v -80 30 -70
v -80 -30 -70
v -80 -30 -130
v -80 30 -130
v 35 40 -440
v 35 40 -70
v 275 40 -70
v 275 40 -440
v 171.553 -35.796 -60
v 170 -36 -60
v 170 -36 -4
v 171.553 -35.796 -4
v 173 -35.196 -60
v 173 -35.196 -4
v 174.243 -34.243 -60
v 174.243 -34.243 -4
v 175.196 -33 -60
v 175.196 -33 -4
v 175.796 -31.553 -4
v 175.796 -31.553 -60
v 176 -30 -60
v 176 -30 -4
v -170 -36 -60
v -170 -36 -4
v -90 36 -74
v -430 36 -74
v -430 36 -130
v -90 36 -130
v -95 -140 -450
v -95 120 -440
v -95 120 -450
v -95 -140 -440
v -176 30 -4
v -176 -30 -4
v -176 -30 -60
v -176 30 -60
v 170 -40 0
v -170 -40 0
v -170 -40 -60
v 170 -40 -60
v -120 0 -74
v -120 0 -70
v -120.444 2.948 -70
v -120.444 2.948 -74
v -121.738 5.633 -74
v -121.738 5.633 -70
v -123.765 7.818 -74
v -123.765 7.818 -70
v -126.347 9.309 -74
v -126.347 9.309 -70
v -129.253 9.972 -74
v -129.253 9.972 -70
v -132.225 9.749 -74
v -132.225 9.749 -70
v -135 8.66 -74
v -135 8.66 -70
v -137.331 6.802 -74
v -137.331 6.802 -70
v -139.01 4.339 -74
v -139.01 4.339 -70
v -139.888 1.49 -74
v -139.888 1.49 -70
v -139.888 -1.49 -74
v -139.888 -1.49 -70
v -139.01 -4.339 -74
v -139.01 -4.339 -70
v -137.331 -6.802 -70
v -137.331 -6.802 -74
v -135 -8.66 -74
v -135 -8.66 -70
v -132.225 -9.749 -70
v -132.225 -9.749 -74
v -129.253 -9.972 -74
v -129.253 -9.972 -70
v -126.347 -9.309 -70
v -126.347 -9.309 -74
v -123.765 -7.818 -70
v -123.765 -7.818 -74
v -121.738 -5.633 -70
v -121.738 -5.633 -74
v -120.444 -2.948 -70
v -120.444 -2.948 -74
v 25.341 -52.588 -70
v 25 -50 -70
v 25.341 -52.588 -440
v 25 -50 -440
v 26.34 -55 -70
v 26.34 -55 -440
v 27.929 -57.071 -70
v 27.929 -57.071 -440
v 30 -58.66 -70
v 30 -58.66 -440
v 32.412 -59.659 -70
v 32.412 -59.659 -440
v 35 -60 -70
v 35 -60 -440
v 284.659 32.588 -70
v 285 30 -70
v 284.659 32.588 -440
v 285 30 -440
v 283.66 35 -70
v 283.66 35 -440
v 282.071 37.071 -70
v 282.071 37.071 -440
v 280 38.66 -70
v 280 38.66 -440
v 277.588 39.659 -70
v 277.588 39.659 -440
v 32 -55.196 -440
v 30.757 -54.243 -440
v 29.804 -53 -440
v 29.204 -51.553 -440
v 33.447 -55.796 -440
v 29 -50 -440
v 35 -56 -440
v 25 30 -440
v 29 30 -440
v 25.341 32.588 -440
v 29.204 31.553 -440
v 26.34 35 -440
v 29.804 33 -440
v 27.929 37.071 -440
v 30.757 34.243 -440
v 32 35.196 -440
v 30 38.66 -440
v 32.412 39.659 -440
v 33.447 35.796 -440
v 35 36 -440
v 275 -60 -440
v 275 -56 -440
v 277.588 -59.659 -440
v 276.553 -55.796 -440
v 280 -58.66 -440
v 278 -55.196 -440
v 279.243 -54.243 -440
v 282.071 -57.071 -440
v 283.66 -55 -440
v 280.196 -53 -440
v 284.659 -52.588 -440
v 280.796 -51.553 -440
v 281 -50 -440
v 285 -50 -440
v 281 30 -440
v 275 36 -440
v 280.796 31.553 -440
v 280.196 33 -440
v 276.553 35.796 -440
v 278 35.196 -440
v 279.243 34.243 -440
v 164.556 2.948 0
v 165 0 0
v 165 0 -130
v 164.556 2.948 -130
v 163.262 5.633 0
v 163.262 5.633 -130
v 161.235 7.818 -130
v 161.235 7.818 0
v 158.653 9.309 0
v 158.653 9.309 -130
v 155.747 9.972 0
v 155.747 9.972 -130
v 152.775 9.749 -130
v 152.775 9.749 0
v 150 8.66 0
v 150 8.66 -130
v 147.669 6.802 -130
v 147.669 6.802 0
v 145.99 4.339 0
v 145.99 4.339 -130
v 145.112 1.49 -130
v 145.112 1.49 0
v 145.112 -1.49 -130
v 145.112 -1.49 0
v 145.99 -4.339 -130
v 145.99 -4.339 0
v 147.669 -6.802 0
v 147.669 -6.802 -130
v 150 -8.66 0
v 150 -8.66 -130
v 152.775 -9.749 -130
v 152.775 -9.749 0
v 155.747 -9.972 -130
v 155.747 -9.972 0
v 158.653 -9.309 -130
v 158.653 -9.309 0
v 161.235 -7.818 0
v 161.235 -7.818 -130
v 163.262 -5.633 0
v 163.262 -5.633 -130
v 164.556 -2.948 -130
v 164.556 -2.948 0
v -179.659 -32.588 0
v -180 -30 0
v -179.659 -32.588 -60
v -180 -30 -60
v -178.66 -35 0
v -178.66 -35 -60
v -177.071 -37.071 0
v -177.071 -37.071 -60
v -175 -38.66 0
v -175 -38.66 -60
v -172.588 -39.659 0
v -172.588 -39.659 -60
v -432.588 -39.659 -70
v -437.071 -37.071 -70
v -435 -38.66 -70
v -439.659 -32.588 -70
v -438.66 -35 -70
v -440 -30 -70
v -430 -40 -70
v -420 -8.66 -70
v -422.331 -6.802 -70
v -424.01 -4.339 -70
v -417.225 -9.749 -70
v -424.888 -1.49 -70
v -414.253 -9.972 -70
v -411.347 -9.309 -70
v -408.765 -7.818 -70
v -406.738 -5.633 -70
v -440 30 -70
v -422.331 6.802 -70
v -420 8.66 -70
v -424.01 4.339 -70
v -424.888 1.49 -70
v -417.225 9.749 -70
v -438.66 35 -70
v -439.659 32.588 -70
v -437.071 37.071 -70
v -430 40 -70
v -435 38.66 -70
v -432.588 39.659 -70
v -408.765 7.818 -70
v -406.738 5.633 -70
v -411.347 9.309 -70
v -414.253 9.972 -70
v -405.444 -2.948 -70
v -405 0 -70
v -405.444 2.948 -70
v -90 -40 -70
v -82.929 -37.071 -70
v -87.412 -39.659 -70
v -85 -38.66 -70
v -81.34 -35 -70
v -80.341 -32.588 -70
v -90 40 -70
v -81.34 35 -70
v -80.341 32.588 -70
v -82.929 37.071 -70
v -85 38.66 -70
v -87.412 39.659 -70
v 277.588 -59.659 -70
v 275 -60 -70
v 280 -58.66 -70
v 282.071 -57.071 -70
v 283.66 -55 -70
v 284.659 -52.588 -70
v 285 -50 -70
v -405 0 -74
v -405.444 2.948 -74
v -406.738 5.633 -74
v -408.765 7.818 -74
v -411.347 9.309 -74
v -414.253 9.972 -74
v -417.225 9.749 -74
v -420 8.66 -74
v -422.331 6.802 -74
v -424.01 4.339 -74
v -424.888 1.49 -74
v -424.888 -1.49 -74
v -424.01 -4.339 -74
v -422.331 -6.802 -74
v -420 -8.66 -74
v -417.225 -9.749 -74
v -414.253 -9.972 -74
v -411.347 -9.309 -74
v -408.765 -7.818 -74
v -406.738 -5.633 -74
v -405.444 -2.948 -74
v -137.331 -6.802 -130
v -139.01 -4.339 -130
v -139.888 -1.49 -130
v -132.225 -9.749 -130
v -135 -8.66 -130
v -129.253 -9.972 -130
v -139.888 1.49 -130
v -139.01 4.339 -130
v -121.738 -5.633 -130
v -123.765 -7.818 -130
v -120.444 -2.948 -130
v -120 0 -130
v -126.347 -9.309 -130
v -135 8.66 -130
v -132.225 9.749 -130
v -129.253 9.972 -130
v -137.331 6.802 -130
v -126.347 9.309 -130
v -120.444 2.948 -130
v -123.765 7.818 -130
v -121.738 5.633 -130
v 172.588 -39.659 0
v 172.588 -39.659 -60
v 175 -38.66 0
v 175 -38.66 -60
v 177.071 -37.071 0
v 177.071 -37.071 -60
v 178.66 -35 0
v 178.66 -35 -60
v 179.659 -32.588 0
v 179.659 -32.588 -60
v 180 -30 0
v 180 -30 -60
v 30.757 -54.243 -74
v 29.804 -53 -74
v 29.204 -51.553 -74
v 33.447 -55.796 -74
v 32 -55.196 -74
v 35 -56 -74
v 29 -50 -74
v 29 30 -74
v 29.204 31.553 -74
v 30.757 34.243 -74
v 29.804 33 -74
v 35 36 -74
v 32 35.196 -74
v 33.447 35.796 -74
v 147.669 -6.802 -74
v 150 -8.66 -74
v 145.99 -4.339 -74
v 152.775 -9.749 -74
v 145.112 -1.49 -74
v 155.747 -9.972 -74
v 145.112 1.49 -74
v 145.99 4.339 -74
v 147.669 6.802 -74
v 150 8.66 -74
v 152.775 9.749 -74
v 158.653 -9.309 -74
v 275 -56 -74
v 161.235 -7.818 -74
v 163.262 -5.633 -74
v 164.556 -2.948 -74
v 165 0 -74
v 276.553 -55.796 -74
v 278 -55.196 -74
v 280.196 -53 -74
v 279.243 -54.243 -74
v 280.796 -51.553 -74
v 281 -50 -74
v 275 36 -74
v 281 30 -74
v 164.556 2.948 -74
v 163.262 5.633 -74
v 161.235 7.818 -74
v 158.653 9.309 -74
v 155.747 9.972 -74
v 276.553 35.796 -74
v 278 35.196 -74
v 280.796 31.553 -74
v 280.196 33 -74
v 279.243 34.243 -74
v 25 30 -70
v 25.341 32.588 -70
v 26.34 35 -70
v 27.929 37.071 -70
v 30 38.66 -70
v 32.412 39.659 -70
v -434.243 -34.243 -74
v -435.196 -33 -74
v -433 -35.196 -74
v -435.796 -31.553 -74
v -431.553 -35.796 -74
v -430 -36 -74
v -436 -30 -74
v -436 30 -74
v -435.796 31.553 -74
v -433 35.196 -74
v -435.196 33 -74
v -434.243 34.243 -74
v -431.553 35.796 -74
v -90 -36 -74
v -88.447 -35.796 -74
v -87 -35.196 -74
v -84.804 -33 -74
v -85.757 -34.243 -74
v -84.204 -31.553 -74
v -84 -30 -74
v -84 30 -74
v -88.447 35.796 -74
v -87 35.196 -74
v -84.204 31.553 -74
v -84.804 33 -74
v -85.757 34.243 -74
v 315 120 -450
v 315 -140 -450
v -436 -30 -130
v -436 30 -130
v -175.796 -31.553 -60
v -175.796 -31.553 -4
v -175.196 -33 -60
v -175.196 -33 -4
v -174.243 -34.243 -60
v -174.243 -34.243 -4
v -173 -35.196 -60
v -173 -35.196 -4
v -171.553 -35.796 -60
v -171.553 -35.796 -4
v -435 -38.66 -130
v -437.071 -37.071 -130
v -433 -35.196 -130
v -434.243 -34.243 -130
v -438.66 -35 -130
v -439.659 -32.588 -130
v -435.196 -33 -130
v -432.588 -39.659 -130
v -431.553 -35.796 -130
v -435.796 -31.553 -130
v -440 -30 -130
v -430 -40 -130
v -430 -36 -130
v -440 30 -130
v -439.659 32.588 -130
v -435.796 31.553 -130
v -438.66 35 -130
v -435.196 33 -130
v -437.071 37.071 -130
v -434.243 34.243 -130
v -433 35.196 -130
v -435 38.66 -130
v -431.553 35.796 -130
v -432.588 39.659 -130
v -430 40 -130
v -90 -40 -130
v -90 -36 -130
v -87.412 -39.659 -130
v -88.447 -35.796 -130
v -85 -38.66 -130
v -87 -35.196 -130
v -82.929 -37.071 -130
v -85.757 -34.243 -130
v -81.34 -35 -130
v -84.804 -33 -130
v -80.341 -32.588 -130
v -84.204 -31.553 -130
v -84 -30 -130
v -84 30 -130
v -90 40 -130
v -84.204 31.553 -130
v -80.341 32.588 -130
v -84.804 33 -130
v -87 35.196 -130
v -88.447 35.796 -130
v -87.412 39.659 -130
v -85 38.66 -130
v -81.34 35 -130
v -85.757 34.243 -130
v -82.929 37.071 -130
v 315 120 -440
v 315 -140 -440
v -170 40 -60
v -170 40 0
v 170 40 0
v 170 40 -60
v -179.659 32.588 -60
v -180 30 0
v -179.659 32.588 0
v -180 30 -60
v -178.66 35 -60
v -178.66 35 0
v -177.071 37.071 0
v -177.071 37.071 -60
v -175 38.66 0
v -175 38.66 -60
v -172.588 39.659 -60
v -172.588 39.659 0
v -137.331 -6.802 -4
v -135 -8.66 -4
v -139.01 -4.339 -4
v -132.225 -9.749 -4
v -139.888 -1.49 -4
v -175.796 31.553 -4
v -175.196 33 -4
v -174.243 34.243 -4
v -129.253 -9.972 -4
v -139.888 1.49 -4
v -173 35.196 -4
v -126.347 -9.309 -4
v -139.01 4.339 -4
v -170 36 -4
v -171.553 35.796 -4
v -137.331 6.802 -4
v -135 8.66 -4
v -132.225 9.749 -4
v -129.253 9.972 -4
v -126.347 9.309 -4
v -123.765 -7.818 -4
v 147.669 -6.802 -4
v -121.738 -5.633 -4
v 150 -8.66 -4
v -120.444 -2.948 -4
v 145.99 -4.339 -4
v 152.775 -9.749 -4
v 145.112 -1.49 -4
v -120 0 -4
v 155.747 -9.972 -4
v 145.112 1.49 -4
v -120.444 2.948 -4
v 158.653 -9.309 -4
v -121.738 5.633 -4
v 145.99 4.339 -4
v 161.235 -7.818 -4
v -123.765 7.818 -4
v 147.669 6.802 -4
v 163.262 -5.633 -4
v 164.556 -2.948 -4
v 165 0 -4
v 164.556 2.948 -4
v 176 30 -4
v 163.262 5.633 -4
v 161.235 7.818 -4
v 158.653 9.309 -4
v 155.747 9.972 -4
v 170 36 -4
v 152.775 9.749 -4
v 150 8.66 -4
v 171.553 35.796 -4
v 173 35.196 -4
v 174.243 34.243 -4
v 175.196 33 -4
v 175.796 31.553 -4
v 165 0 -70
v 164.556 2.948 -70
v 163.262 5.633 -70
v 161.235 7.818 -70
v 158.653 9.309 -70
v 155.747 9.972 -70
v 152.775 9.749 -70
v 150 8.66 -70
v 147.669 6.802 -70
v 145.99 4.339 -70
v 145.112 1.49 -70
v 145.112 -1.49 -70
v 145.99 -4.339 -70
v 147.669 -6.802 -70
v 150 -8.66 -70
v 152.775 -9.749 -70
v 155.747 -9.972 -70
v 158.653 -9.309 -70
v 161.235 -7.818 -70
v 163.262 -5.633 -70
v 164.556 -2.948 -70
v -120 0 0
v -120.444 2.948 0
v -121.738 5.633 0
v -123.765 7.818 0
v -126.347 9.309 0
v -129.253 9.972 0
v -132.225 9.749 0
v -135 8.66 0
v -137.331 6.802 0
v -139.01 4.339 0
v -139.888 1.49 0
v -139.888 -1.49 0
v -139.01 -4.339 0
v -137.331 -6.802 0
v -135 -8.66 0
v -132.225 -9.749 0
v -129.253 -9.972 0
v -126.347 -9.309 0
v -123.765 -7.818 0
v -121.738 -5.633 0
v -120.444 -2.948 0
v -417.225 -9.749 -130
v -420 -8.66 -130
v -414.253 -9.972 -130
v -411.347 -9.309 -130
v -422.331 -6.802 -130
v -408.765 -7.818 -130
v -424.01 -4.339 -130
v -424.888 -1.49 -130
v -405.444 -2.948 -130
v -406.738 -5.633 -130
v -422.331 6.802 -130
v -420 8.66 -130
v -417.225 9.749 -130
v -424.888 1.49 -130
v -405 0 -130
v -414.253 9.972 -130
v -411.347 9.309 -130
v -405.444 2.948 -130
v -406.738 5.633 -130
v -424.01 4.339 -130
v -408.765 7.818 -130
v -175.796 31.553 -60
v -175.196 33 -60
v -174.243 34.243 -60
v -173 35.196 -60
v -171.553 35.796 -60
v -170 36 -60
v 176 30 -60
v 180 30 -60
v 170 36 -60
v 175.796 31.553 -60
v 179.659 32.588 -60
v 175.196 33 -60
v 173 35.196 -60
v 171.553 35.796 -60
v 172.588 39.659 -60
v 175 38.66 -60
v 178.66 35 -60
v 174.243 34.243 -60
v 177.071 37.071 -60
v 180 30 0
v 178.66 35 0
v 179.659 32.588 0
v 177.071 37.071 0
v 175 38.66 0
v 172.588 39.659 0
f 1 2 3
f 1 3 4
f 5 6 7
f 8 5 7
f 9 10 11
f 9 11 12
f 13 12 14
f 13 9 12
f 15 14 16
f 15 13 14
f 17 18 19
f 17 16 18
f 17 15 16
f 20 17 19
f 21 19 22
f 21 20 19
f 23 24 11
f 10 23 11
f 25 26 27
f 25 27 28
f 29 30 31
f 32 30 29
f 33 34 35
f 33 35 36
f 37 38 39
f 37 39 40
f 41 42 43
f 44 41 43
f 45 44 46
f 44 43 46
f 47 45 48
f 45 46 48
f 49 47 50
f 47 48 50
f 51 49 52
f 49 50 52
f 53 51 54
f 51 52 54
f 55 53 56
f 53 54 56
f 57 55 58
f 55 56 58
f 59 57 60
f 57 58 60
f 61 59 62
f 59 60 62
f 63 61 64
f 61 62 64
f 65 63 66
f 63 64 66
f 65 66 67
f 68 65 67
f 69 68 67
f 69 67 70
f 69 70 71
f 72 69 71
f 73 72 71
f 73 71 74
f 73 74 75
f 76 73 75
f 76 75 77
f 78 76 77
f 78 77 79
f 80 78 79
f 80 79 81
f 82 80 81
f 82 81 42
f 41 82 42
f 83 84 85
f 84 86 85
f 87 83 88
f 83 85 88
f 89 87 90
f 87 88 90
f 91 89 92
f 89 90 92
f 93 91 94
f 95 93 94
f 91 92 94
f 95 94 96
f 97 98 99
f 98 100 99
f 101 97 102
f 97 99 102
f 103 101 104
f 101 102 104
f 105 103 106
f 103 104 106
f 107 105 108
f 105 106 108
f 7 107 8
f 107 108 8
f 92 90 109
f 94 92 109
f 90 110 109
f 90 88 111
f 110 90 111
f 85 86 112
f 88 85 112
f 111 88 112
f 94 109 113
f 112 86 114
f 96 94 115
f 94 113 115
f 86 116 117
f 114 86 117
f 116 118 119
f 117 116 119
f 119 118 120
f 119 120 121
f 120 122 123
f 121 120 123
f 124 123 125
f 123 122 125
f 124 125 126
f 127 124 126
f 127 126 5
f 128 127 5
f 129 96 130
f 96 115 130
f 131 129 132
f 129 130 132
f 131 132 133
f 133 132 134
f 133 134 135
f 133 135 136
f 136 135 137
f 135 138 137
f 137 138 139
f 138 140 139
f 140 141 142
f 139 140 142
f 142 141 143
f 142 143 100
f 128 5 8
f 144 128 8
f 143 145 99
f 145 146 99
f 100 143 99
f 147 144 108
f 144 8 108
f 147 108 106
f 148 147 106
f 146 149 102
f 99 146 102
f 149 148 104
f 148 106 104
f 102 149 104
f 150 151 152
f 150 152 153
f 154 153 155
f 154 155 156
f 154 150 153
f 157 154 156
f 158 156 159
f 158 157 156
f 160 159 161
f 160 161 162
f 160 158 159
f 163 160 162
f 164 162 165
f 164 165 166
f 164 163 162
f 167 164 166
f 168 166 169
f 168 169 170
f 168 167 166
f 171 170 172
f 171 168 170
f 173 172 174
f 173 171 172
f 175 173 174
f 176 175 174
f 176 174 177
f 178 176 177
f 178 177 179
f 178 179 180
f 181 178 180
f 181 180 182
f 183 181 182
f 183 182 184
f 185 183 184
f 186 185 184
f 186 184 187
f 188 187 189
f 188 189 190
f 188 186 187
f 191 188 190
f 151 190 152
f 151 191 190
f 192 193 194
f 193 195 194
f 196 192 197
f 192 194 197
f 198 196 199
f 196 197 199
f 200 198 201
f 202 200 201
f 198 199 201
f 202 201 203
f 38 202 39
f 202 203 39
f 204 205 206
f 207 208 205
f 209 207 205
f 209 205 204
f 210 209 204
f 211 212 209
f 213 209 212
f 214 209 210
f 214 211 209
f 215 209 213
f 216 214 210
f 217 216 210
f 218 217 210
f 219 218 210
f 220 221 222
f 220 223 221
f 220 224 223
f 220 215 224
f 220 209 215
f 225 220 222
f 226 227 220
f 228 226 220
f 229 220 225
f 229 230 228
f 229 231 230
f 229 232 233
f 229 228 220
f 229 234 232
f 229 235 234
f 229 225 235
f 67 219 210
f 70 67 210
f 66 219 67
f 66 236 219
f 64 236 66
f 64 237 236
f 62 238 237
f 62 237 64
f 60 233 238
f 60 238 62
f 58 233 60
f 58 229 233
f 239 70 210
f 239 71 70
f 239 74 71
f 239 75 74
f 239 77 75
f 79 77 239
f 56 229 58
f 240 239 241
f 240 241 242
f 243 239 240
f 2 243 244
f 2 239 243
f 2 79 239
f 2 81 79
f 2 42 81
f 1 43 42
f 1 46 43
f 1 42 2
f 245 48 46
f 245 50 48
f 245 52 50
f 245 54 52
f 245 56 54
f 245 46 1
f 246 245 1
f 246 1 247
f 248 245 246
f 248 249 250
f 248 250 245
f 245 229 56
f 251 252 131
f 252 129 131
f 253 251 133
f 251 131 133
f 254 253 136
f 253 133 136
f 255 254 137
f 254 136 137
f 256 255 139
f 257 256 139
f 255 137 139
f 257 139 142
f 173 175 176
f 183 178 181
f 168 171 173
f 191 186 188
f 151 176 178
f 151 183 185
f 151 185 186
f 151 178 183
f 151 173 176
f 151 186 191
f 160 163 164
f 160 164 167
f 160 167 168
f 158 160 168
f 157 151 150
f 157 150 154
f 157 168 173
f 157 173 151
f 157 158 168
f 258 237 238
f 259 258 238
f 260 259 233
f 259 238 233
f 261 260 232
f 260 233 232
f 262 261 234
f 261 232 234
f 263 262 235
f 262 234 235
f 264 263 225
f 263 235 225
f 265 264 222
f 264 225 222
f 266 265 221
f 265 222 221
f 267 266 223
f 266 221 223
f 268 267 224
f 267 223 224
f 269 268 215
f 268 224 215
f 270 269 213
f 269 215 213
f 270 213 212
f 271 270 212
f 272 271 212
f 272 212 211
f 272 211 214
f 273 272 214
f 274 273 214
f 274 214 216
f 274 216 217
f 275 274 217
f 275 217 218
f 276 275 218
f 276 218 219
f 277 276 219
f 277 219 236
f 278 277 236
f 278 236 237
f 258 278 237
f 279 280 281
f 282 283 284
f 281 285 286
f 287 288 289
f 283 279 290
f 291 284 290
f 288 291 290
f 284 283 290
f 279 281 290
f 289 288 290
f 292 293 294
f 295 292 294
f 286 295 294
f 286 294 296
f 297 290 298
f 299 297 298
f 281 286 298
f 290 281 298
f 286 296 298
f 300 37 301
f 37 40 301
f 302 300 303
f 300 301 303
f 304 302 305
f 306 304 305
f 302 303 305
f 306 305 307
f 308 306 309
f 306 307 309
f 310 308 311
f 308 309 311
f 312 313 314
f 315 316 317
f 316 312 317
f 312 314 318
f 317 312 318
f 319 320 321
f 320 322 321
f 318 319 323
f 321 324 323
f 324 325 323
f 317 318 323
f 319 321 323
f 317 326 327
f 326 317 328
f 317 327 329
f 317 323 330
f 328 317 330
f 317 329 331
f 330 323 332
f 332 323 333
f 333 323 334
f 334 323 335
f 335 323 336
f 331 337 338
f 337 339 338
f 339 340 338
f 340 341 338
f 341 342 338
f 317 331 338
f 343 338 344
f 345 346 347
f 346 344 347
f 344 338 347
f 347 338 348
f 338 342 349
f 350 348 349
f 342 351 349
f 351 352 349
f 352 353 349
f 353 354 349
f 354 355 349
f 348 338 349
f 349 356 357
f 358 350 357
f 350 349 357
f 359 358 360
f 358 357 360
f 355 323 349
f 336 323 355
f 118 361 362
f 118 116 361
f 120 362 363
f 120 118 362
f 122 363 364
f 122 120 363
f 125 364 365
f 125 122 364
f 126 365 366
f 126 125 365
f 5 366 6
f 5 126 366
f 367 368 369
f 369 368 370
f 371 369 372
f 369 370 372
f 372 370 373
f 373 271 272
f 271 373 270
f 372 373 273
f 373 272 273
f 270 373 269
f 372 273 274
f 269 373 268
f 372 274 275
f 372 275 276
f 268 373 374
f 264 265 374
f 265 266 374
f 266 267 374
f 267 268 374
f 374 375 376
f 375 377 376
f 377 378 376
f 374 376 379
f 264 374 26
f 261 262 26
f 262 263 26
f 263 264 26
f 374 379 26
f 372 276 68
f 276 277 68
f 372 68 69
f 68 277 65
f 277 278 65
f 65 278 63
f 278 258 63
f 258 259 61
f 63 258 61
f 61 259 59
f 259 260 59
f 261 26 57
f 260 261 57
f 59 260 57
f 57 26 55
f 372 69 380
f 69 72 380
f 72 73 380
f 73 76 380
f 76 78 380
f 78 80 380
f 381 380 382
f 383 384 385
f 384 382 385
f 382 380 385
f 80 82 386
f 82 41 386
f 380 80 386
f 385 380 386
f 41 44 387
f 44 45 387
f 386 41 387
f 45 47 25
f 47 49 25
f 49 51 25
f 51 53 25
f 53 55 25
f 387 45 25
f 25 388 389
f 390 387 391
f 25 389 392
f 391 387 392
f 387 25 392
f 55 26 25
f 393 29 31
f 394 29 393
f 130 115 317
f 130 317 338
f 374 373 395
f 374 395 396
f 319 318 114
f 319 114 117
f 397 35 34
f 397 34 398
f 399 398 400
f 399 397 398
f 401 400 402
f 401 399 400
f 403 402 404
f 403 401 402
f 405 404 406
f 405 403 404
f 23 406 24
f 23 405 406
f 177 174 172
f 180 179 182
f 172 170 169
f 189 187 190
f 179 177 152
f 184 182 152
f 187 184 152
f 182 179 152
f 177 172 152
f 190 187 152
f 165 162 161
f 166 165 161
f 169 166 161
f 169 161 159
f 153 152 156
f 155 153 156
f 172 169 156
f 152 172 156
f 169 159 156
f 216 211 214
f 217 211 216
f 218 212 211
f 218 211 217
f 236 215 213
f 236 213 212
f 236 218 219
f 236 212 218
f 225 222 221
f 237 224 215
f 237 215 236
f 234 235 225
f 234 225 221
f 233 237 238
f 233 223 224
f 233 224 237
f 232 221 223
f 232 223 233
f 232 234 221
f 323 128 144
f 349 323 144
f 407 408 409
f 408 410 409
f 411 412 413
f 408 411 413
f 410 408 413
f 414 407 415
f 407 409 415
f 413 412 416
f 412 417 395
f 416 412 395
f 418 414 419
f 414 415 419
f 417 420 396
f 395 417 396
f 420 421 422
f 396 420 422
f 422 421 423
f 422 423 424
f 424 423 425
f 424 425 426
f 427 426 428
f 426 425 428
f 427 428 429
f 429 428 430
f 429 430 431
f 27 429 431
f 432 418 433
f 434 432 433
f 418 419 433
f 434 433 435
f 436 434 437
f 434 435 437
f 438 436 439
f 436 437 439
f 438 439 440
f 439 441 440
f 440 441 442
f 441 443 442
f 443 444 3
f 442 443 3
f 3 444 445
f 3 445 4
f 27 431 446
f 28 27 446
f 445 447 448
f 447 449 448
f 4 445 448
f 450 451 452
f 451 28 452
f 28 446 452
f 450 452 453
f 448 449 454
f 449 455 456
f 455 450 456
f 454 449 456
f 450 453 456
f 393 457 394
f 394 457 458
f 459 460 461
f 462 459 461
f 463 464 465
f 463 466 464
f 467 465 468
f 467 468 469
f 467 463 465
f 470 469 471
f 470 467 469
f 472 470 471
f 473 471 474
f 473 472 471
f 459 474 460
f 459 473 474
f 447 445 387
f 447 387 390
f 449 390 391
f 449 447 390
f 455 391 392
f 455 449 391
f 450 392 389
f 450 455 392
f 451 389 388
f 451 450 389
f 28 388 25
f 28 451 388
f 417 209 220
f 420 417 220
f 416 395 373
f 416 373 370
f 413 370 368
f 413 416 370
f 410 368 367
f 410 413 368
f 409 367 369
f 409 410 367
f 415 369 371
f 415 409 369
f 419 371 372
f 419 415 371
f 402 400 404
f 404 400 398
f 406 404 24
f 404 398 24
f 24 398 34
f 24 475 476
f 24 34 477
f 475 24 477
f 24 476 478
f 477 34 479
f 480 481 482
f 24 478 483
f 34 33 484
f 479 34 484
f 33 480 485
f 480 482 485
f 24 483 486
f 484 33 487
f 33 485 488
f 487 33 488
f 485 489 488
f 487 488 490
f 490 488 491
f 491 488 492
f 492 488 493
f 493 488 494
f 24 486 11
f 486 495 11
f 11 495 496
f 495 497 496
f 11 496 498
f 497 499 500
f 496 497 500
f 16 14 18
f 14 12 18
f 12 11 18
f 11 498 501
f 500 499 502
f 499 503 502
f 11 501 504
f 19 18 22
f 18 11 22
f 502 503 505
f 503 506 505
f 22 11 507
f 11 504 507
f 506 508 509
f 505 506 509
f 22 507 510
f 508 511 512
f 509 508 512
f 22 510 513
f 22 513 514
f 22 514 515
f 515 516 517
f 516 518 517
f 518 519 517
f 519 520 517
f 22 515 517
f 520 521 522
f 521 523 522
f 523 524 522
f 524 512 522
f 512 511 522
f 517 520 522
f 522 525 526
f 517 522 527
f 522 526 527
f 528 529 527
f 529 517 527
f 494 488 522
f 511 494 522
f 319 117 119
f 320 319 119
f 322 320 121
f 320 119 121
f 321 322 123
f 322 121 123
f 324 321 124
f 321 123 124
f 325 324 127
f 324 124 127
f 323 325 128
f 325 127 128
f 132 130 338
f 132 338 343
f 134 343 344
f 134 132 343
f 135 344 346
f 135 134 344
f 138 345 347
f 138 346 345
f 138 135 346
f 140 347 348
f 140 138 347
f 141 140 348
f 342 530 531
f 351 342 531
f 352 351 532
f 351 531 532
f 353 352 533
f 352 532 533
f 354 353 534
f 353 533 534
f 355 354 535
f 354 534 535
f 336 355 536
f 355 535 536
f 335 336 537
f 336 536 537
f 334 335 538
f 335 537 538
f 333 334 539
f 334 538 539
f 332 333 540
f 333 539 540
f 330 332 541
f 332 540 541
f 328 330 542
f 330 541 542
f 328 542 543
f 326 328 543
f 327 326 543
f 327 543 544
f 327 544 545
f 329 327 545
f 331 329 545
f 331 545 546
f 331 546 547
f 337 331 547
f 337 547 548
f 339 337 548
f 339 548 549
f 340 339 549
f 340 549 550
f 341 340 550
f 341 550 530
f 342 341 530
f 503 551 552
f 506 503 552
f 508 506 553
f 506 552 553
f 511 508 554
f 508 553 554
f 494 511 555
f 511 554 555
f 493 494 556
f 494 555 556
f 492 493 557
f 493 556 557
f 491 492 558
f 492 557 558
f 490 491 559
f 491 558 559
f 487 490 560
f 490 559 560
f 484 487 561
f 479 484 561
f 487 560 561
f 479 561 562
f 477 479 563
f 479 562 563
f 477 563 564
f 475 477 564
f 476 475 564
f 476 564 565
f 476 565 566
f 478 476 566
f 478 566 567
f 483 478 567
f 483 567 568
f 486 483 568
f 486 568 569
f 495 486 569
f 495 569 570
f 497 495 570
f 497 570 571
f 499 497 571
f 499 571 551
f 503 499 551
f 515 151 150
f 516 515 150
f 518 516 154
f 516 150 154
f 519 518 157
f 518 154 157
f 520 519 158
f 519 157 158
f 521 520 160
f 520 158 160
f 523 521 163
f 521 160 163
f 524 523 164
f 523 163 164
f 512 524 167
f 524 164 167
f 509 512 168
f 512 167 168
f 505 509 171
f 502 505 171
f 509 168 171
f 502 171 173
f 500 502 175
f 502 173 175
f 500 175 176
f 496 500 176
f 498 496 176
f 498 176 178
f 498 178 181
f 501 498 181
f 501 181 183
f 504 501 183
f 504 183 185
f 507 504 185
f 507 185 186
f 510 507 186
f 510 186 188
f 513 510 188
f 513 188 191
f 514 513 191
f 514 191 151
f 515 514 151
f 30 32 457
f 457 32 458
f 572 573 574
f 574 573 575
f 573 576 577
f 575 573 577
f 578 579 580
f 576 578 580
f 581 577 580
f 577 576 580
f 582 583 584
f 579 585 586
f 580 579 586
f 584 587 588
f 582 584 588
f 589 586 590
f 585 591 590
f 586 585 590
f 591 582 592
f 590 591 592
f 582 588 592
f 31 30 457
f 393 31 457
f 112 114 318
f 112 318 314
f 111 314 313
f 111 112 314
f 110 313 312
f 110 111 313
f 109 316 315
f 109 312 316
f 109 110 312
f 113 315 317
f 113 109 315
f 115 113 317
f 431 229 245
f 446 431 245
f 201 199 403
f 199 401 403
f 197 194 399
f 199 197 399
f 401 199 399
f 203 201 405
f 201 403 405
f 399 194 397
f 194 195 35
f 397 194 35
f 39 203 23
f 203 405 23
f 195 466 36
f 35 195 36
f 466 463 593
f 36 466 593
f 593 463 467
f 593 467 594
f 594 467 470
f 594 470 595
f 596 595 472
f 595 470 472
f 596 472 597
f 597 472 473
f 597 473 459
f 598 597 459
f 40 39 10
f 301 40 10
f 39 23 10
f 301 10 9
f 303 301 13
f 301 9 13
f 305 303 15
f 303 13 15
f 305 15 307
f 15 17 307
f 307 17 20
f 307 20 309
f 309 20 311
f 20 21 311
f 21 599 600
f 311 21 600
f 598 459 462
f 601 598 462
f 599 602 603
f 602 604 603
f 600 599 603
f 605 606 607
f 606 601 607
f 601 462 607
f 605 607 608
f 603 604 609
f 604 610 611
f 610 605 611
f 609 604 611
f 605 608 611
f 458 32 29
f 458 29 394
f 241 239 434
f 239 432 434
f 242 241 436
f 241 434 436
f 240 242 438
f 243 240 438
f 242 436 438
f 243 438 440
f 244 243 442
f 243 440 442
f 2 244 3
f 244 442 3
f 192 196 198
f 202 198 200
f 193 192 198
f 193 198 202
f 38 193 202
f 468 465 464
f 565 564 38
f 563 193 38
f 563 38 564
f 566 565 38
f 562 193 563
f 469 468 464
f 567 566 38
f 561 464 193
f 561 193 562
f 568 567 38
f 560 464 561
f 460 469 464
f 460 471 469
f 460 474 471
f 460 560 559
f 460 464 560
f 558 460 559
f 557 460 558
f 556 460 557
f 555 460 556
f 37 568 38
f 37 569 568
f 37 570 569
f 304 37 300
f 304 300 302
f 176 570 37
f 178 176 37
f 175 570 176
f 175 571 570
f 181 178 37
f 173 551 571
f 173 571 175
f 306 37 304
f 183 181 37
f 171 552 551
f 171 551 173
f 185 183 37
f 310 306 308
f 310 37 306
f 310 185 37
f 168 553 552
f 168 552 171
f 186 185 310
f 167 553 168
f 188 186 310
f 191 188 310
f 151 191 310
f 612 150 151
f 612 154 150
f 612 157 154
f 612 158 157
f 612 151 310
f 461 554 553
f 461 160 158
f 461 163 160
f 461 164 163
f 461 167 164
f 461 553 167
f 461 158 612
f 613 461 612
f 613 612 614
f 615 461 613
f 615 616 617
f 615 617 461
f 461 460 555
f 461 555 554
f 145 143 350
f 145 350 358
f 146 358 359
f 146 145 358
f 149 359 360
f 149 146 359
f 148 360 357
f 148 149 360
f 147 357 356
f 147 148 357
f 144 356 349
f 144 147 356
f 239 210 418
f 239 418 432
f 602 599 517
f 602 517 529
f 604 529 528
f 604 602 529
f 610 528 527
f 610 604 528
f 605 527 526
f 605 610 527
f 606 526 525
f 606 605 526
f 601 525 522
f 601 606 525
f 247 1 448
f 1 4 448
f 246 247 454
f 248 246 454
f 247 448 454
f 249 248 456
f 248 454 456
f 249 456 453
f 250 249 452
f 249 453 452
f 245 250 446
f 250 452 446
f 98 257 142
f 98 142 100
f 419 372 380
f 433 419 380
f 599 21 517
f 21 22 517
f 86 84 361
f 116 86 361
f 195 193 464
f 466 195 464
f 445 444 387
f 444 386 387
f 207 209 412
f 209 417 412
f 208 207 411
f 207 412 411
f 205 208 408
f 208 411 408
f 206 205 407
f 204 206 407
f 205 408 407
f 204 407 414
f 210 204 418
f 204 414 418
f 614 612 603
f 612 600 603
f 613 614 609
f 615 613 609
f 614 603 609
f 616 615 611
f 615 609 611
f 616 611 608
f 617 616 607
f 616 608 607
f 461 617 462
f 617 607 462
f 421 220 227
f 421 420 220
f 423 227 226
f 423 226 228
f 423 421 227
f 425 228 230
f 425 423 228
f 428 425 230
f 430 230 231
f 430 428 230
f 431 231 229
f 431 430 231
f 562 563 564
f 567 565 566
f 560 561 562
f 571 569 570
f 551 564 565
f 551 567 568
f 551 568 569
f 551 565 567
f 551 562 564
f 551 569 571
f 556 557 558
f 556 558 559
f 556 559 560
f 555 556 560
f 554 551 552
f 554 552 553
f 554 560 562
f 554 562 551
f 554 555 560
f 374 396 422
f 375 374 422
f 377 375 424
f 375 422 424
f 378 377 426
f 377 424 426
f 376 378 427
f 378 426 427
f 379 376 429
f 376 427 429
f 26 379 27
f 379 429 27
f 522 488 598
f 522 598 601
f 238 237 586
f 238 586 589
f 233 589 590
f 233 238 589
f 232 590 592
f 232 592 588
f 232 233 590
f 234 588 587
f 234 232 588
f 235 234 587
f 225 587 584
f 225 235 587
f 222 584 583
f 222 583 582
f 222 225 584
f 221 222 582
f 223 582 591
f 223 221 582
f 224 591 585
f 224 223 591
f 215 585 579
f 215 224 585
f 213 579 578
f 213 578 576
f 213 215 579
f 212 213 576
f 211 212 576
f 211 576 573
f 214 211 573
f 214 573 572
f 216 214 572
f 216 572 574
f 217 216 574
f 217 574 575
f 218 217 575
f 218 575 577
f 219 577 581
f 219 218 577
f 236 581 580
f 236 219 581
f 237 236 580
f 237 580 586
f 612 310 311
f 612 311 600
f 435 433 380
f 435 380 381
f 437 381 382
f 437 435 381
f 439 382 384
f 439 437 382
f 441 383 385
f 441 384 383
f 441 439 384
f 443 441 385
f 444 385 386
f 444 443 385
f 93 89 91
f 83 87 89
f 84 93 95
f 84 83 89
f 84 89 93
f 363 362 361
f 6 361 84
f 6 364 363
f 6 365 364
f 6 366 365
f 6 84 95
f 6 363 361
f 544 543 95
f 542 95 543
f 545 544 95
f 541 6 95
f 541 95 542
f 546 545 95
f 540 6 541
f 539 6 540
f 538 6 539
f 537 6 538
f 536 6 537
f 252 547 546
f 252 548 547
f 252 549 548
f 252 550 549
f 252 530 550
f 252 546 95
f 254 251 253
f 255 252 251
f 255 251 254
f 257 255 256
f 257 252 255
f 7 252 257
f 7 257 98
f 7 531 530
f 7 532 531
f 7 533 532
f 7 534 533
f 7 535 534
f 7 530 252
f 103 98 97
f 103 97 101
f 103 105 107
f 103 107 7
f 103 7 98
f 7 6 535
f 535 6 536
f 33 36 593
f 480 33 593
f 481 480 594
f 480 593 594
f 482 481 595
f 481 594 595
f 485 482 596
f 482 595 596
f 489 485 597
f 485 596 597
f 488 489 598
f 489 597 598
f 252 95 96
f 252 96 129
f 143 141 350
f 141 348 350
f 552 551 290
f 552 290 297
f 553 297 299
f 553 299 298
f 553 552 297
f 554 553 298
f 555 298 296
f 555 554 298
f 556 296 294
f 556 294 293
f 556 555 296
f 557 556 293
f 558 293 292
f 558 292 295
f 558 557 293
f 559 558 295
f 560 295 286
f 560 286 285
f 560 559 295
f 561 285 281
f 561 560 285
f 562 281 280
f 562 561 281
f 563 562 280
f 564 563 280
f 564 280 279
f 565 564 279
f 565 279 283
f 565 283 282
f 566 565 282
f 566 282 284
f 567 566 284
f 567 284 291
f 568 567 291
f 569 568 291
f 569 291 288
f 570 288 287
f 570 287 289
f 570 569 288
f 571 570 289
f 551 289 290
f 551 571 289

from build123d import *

# Parameters (mm, degrees)
F0_W      = 360
F0_H      = 80
F1_DEPTH  = 60
F3_W      = 260
F3_H      = 100
F4_DEPTH  = 370
F5_W      = 410
F5_H      = 260
F5_W_2    = 260
F5_H_2    = 100
F6_DEPTH  = 10
F7_W      = 360
F7_H      = 80
F8_DEPTH  = 60
F10_R     = 10
F10_2_R   = 10
F10_3_R   = 10
F11_T     = -4
F11_2_T   = -4
F11_3_T   = -4
F9_R      = 10
F12_DEPTH = 130
F13_DEPTH = 130
F14_R     = 10
F15_DEPTH = 60
F20_R     = 17.5
F20_R_2   = 10
F21_DEPTH = 10


# Not quite as in the source:
# - a feature names something its author has since deleted; it is built from what else it names


with BuildPart() as f1:
    # F0 (on Top) → F1 (new body)
    with BuildSketch(Plane.XY):
        Rectangle(F0_W, F0_H)
    extrude(amount=-F1_DEPTH)

    # F10
    f10_edges = [f1.edges().sort_by_distance(p)[0] for p in [
        (-180, -40, -30),
        (180, -40, -30),
        (180, 40, -30),
        (-180, 40, -30),
    ]]
    fillet(f10_edges, radius=F10_R)

    # F11
    f11_openings = [f1.faces().sort_by_distance(p)[0] for p in [
        (0, 0, -60),
    ]]
    offset(amount=F11_T, openings=f11_openings)


with BuildPart() as f4:
    # F3 (on offset) → F4 (new body)
    with BuildSketch(Plane.XY.offset(-70)):
        with Locations((155, -10)):
            Rectangle(F3_W, F3_H)
    extrude(amount=-F4_DEPTH)

    # F10#2
    f10_2_edges = [f4.edges().sort_by_distance(p)[0] for p in [
        (25, 40, -255),
        (25, -60, -255),
        (285, 40, -255),
        (285, -60, -255),
    ]]
    fillet(f10_2_edges, radius=F10_2_R)

    # F11#3
    f11_3_openings = [f4.faces().sort_by_distance(p)[0] for p in [
        (155, -10, -440),
    ]]
    offset(amount=F11_3_T, openings=f11_3_openings)


with BuildPart() as f6:
    # F5 (on face) → F6 (new body)
    with BuildSketch(Plane(origin=(0, 0, -440), x_dir=(1, 0, 0), z_dir=(0, 0, -1))):
        with Locations((110, 10)):
            Rectangle(F5_W, F5_H)
        with Locations((155, 10)):
            Rectangle(F5_W_2, F5_H_2, mode=Mode.SUBTRACT)
        with Locations((155, 10)):
            Rectangle(F5_W_2, F5_H_2)
    extrude(amount=F6_DEPTH)


with BuildPart() as f8:
    # F7 (on face) → F8 (new body)
    with BuildSketch(Plane.XY.offset(-70)):
        with Locations((-260, 0)):
            Rectangle(F7_W, F7_H)
    extrude(amount=-F8_DEPTH)

    # F10#3
    f10_3_edges = [f8.edges().sort_by_distance(p)[0] for p in [
        (-440, -40, -100),
        (-440, 40, -100),
        (-80, 40, -100),
        (-80, -40, -100),
    ]]
    fillet(f10_3_edges, radius=F10_3_R)

    # F11#2
    f11_2_openings = [f8.faces().sort_by_distance(p)[0] for p in [
        (-260, 0, -130),
    ]]
    offset(amount=F11_2_T, openings=f11_2_openings)


with BuildPart() as f12_tool:
    # F9 (on face) → F12 (new body)
    with BuildSketch(Plane.XY):
        with Locations((-415, 0)):
            Circle(F9_R)
        with Locations((-130, 0)):
            Circle(F9_R)
        with Locations((155, 0)):
            Circle(F9_R)
    extrude(amount=-F12_DEPTH)


with BuildPart() as f1_1:
    add(f1.part)

    # F12: cut by f12_tool
    add(f12_tool.part, mode=Mode.SUBTRACT)


with BuildPart() as f4_1:
    add(f4.part)

    # F12: cut by f12_tool
    add(f12_tool.part, mode=Mode.SUBTRACT)


with BuildPart() as f8_1:
    add(f8.part)

    # F12: cut by f12_tool
    add(f12_tool.part, mode=Mode.SUBTRACT)


with BuildPart() as f13:
    # F9 (on face) → F13 (new body)
    with BuildSketch(Plane.XY):
        with Locations((-130, 0)):
            Circle(F9_R)
    extrude(amount=-F13_DEPTH)


with BuildPart() as f13b:
    # F9 (on face) → F13, piece 2 (new body)
    with BuildSketch(Plane.XY):
        with Locations((155, 0)):
            Circle(F9_R)
    extrude(amount=-F13_DEPTH)


with BuildPart() as f15:
    # F14 (on face) → F15 (new body)
    with BuildSketch(Plane.XY.offset(-70)):
        with Locations((-415, 0)):
            Circle(F14_R)
    extrude(amount=-F15_DEPTH)


with BuildPart() as f21:
    # F20 (on offset) → F21 (new body)
    with BuildSketch(Plane(origin=(0, 0, -107), x_dir=(1, 0, 0), z_dir=(0, 0, -1))):
        with Locations((-130, 0)):
            Circle(F20_R)
        with Locations((-130, 0)):
            Circle(F20_R_2, mode=Mode.SUBTRACT)
    extrude(amount=-F21_DEPTH)


solid = Compound([f6.part, f1_1.part, f4_1.part, f8_1.part, f13.part, f13b.part, f15.part])
